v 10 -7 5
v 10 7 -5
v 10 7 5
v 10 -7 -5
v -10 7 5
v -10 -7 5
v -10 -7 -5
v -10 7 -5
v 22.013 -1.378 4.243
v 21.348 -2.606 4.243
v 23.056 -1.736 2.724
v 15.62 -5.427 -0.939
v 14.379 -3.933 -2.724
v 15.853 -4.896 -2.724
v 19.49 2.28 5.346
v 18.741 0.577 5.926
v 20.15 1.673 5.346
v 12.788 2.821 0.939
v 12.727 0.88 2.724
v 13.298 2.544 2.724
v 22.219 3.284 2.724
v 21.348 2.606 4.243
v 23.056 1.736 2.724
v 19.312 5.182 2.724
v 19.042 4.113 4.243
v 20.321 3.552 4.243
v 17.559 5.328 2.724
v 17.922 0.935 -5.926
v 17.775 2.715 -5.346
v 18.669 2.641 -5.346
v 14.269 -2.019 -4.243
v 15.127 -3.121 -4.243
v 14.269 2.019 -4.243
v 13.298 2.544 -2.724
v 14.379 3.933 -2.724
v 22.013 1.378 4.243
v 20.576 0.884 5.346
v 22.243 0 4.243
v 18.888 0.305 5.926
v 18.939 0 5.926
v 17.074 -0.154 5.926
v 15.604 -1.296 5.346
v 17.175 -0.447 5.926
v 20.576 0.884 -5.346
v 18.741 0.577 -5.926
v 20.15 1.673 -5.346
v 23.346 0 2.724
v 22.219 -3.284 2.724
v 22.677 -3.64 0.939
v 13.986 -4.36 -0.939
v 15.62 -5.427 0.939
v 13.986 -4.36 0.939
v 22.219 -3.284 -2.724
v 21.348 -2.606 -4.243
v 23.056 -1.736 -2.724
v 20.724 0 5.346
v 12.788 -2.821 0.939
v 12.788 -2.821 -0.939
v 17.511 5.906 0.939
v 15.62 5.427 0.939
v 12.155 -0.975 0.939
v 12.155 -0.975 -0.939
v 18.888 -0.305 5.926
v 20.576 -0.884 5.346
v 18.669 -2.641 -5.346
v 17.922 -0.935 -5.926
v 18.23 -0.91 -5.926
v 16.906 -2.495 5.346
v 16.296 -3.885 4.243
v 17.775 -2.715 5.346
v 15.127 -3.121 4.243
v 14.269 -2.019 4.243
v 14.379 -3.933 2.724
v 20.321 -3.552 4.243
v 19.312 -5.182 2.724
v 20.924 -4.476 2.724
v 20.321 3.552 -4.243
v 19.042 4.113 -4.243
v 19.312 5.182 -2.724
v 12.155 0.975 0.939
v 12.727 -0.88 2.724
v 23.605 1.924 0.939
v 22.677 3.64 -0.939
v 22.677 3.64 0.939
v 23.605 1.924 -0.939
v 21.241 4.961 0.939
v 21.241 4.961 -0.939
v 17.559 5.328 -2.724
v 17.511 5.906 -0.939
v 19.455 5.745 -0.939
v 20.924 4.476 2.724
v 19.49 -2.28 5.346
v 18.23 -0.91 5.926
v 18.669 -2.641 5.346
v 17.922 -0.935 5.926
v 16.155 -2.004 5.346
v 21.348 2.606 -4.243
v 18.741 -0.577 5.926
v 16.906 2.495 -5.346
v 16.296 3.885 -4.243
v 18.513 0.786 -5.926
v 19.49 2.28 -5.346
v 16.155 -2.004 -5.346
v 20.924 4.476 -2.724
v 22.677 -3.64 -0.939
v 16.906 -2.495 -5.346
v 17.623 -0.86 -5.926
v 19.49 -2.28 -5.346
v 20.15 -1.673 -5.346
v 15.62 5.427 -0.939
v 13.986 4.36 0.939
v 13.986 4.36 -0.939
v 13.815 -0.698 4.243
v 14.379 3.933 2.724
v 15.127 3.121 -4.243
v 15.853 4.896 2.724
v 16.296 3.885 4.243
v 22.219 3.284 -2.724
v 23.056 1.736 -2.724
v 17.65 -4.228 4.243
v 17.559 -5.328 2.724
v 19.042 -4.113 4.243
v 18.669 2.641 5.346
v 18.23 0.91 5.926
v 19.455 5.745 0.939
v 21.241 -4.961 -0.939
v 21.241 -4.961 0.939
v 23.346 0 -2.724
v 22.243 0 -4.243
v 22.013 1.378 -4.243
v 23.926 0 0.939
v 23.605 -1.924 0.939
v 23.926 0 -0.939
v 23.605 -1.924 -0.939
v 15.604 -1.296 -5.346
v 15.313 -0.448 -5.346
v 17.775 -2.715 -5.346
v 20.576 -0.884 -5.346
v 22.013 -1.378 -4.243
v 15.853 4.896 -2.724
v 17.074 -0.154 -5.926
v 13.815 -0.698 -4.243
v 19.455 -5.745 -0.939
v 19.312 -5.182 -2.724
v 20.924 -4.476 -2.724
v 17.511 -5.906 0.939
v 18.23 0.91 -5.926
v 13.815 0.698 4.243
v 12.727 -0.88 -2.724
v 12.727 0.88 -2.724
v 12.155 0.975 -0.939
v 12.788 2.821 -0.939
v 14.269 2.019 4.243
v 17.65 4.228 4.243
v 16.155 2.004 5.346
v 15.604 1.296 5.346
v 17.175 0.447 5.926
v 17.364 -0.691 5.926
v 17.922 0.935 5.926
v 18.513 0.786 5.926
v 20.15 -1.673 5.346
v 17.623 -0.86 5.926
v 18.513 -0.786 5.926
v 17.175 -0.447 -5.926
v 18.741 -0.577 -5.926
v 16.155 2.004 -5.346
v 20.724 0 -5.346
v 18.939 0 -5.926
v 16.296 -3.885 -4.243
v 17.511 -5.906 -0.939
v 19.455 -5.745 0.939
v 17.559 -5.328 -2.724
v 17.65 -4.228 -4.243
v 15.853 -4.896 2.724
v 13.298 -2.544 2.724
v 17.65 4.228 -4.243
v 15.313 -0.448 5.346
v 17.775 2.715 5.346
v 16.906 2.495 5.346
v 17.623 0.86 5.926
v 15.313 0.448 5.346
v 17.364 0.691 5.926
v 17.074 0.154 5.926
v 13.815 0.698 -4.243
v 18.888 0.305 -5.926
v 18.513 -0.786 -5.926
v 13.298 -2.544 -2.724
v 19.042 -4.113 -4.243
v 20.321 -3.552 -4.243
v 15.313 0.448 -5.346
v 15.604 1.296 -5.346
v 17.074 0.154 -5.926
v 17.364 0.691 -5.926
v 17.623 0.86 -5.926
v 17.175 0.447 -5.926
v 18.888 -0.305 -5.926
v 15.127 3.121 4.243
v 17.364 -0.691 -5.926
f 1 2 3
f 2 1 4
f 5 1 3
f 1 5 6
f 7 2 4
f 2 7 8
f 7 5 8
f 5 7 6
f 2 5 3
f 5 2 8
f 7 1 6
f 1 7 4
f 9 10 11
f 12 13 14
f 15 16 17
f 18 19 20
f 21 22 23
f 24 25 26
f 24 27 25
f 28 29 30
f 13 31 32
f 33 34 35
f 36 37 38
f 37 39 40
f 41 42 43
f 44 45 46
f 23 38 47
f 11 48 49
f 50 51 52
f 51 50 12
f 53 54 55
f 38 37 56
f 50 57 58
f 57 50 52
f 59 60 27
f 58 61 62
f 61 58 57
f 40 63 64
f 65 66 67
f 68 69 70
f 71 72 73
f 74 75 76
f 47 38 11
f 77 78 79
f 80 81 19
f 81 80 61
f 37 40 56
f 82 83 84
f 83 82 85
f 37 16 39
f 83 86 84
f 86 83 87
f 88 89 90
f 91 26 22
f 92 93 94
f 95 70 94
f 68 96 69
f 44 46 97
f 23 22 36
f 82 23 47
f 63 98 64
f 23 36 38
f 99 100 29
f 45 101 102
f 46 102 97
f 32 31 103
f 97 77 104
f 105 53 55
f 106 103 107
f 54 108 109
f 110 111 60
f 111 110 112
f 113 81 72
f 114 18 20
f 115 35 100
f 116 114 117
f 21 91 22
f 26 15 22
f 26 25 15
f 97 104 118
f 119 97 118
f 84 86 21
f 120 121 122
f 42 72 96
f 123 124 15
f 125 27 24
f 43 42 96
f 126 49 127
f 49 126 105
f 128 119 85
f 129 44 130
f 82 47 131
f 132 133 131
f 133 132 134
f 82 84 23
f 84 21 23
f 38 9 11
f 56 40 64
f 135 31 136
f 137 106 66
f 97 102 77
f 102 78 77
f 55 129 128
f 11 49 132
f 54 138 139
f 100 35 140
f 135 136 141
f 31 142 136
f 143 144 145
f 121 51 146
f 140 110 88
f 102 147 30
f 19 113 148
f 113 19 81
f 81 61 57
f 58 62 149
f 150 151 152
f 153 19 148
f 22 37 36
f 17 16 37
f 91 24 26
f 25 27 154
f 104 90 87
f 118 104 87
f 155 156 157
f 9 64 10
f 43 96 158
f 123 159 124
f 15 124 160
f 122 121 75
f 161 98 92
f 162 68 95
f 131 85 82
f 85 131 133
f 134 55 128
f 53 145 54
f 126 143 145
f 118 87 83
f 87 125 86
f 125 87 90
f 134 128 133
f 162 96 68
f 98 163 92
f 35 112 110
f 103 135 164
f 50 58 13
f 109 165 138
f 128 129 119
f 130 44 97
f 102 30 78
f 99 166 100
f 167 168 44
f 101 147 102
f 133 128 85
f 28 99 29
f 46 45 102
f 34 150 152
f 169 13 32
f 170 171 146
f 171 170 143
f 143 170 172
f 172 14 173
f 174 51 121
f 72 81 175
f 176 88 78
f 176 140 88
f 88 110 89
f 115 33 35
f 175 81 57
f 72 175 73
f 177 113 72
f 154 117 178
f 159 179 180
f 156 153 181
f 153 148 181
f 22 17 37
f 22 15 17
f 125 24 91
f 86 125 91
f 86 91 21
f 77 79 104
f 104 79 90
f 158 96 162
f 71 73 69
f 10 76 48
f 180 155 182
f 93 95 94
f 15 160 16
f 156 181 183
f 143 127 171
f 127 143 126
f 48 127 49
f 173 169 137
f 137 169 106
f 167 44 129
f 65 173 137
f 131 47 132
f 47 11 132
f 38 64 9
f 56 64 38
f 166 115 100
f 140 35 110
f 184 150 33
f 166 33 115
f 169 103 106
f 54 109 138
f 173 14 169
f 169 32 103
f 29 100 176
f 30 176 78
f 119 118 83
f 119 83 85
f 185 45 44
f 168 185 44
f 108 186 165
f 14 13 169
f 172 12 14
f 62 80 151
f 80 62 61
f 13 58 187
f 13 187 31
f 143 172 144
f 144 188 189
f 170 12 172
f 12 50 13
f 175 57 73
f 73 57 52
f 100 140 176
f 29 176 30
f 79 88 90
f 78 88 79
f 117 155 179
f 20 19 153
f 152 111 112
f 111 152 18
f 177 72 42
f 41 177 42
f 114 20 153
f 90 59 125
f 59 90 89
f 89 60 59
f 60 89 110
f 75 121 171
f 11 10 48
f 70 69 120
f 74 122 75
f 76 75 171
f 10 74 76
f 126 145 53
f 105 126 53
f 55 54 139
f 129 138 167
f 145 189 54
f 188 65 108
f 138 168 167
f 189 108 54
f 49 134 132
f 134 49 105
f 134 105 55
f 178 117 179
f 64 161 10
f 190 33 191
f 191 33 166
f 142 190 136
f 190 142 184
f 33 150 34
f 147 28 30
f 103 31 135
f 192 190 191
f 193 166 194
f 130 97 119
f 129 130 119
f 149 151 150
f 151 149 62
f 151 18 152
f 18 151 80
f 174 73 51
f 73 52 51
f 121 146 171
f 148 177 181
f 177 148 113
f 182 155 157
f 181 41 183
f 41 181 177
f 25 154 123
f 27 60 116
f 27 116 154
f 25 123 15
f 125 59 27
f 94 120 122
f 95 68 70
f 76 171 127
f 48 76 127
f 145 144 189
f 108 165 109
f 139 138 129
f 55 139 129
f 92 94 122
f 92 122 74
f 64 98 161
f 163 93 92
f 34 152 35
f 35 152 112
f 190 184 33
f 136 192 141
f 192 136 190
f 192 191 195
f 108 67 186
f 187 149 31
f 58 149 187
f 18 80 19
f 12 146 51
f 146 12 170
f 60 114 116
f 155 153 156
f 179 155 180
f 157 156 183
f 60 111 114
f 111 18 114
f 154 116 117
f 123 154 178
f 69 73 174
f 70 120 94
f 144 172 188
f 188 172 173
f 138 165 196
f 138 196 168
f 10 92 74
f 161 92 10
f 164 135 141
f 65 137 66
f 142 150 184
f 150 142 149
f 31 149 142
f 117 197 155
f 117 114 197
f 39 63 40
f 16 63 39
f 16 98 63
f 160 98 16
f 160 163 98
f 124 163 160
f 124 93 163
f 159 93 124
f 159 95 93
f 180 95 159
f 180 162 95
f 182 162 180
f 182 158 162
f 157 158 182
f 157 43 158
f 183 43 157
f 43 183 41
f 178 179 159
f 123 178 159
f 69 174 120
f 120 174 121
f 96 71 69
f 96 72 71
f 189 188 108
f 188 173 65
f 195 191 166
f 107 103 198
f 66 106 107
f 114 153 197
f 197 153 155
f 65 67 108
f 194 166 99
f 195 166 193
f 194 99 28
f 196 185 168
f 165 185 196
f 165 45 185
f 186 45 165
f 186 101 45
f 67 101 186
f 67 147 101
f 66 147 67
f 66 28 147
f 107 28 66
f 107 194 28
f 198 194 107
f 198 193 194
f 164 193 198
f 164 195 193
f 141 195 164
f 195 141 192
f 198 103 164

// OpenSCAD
union(){
  translate([0, 0, 0]) cube([20, 14, 10], center=true);
  translate([18, 0, 0]) sphere(r=6);
}
